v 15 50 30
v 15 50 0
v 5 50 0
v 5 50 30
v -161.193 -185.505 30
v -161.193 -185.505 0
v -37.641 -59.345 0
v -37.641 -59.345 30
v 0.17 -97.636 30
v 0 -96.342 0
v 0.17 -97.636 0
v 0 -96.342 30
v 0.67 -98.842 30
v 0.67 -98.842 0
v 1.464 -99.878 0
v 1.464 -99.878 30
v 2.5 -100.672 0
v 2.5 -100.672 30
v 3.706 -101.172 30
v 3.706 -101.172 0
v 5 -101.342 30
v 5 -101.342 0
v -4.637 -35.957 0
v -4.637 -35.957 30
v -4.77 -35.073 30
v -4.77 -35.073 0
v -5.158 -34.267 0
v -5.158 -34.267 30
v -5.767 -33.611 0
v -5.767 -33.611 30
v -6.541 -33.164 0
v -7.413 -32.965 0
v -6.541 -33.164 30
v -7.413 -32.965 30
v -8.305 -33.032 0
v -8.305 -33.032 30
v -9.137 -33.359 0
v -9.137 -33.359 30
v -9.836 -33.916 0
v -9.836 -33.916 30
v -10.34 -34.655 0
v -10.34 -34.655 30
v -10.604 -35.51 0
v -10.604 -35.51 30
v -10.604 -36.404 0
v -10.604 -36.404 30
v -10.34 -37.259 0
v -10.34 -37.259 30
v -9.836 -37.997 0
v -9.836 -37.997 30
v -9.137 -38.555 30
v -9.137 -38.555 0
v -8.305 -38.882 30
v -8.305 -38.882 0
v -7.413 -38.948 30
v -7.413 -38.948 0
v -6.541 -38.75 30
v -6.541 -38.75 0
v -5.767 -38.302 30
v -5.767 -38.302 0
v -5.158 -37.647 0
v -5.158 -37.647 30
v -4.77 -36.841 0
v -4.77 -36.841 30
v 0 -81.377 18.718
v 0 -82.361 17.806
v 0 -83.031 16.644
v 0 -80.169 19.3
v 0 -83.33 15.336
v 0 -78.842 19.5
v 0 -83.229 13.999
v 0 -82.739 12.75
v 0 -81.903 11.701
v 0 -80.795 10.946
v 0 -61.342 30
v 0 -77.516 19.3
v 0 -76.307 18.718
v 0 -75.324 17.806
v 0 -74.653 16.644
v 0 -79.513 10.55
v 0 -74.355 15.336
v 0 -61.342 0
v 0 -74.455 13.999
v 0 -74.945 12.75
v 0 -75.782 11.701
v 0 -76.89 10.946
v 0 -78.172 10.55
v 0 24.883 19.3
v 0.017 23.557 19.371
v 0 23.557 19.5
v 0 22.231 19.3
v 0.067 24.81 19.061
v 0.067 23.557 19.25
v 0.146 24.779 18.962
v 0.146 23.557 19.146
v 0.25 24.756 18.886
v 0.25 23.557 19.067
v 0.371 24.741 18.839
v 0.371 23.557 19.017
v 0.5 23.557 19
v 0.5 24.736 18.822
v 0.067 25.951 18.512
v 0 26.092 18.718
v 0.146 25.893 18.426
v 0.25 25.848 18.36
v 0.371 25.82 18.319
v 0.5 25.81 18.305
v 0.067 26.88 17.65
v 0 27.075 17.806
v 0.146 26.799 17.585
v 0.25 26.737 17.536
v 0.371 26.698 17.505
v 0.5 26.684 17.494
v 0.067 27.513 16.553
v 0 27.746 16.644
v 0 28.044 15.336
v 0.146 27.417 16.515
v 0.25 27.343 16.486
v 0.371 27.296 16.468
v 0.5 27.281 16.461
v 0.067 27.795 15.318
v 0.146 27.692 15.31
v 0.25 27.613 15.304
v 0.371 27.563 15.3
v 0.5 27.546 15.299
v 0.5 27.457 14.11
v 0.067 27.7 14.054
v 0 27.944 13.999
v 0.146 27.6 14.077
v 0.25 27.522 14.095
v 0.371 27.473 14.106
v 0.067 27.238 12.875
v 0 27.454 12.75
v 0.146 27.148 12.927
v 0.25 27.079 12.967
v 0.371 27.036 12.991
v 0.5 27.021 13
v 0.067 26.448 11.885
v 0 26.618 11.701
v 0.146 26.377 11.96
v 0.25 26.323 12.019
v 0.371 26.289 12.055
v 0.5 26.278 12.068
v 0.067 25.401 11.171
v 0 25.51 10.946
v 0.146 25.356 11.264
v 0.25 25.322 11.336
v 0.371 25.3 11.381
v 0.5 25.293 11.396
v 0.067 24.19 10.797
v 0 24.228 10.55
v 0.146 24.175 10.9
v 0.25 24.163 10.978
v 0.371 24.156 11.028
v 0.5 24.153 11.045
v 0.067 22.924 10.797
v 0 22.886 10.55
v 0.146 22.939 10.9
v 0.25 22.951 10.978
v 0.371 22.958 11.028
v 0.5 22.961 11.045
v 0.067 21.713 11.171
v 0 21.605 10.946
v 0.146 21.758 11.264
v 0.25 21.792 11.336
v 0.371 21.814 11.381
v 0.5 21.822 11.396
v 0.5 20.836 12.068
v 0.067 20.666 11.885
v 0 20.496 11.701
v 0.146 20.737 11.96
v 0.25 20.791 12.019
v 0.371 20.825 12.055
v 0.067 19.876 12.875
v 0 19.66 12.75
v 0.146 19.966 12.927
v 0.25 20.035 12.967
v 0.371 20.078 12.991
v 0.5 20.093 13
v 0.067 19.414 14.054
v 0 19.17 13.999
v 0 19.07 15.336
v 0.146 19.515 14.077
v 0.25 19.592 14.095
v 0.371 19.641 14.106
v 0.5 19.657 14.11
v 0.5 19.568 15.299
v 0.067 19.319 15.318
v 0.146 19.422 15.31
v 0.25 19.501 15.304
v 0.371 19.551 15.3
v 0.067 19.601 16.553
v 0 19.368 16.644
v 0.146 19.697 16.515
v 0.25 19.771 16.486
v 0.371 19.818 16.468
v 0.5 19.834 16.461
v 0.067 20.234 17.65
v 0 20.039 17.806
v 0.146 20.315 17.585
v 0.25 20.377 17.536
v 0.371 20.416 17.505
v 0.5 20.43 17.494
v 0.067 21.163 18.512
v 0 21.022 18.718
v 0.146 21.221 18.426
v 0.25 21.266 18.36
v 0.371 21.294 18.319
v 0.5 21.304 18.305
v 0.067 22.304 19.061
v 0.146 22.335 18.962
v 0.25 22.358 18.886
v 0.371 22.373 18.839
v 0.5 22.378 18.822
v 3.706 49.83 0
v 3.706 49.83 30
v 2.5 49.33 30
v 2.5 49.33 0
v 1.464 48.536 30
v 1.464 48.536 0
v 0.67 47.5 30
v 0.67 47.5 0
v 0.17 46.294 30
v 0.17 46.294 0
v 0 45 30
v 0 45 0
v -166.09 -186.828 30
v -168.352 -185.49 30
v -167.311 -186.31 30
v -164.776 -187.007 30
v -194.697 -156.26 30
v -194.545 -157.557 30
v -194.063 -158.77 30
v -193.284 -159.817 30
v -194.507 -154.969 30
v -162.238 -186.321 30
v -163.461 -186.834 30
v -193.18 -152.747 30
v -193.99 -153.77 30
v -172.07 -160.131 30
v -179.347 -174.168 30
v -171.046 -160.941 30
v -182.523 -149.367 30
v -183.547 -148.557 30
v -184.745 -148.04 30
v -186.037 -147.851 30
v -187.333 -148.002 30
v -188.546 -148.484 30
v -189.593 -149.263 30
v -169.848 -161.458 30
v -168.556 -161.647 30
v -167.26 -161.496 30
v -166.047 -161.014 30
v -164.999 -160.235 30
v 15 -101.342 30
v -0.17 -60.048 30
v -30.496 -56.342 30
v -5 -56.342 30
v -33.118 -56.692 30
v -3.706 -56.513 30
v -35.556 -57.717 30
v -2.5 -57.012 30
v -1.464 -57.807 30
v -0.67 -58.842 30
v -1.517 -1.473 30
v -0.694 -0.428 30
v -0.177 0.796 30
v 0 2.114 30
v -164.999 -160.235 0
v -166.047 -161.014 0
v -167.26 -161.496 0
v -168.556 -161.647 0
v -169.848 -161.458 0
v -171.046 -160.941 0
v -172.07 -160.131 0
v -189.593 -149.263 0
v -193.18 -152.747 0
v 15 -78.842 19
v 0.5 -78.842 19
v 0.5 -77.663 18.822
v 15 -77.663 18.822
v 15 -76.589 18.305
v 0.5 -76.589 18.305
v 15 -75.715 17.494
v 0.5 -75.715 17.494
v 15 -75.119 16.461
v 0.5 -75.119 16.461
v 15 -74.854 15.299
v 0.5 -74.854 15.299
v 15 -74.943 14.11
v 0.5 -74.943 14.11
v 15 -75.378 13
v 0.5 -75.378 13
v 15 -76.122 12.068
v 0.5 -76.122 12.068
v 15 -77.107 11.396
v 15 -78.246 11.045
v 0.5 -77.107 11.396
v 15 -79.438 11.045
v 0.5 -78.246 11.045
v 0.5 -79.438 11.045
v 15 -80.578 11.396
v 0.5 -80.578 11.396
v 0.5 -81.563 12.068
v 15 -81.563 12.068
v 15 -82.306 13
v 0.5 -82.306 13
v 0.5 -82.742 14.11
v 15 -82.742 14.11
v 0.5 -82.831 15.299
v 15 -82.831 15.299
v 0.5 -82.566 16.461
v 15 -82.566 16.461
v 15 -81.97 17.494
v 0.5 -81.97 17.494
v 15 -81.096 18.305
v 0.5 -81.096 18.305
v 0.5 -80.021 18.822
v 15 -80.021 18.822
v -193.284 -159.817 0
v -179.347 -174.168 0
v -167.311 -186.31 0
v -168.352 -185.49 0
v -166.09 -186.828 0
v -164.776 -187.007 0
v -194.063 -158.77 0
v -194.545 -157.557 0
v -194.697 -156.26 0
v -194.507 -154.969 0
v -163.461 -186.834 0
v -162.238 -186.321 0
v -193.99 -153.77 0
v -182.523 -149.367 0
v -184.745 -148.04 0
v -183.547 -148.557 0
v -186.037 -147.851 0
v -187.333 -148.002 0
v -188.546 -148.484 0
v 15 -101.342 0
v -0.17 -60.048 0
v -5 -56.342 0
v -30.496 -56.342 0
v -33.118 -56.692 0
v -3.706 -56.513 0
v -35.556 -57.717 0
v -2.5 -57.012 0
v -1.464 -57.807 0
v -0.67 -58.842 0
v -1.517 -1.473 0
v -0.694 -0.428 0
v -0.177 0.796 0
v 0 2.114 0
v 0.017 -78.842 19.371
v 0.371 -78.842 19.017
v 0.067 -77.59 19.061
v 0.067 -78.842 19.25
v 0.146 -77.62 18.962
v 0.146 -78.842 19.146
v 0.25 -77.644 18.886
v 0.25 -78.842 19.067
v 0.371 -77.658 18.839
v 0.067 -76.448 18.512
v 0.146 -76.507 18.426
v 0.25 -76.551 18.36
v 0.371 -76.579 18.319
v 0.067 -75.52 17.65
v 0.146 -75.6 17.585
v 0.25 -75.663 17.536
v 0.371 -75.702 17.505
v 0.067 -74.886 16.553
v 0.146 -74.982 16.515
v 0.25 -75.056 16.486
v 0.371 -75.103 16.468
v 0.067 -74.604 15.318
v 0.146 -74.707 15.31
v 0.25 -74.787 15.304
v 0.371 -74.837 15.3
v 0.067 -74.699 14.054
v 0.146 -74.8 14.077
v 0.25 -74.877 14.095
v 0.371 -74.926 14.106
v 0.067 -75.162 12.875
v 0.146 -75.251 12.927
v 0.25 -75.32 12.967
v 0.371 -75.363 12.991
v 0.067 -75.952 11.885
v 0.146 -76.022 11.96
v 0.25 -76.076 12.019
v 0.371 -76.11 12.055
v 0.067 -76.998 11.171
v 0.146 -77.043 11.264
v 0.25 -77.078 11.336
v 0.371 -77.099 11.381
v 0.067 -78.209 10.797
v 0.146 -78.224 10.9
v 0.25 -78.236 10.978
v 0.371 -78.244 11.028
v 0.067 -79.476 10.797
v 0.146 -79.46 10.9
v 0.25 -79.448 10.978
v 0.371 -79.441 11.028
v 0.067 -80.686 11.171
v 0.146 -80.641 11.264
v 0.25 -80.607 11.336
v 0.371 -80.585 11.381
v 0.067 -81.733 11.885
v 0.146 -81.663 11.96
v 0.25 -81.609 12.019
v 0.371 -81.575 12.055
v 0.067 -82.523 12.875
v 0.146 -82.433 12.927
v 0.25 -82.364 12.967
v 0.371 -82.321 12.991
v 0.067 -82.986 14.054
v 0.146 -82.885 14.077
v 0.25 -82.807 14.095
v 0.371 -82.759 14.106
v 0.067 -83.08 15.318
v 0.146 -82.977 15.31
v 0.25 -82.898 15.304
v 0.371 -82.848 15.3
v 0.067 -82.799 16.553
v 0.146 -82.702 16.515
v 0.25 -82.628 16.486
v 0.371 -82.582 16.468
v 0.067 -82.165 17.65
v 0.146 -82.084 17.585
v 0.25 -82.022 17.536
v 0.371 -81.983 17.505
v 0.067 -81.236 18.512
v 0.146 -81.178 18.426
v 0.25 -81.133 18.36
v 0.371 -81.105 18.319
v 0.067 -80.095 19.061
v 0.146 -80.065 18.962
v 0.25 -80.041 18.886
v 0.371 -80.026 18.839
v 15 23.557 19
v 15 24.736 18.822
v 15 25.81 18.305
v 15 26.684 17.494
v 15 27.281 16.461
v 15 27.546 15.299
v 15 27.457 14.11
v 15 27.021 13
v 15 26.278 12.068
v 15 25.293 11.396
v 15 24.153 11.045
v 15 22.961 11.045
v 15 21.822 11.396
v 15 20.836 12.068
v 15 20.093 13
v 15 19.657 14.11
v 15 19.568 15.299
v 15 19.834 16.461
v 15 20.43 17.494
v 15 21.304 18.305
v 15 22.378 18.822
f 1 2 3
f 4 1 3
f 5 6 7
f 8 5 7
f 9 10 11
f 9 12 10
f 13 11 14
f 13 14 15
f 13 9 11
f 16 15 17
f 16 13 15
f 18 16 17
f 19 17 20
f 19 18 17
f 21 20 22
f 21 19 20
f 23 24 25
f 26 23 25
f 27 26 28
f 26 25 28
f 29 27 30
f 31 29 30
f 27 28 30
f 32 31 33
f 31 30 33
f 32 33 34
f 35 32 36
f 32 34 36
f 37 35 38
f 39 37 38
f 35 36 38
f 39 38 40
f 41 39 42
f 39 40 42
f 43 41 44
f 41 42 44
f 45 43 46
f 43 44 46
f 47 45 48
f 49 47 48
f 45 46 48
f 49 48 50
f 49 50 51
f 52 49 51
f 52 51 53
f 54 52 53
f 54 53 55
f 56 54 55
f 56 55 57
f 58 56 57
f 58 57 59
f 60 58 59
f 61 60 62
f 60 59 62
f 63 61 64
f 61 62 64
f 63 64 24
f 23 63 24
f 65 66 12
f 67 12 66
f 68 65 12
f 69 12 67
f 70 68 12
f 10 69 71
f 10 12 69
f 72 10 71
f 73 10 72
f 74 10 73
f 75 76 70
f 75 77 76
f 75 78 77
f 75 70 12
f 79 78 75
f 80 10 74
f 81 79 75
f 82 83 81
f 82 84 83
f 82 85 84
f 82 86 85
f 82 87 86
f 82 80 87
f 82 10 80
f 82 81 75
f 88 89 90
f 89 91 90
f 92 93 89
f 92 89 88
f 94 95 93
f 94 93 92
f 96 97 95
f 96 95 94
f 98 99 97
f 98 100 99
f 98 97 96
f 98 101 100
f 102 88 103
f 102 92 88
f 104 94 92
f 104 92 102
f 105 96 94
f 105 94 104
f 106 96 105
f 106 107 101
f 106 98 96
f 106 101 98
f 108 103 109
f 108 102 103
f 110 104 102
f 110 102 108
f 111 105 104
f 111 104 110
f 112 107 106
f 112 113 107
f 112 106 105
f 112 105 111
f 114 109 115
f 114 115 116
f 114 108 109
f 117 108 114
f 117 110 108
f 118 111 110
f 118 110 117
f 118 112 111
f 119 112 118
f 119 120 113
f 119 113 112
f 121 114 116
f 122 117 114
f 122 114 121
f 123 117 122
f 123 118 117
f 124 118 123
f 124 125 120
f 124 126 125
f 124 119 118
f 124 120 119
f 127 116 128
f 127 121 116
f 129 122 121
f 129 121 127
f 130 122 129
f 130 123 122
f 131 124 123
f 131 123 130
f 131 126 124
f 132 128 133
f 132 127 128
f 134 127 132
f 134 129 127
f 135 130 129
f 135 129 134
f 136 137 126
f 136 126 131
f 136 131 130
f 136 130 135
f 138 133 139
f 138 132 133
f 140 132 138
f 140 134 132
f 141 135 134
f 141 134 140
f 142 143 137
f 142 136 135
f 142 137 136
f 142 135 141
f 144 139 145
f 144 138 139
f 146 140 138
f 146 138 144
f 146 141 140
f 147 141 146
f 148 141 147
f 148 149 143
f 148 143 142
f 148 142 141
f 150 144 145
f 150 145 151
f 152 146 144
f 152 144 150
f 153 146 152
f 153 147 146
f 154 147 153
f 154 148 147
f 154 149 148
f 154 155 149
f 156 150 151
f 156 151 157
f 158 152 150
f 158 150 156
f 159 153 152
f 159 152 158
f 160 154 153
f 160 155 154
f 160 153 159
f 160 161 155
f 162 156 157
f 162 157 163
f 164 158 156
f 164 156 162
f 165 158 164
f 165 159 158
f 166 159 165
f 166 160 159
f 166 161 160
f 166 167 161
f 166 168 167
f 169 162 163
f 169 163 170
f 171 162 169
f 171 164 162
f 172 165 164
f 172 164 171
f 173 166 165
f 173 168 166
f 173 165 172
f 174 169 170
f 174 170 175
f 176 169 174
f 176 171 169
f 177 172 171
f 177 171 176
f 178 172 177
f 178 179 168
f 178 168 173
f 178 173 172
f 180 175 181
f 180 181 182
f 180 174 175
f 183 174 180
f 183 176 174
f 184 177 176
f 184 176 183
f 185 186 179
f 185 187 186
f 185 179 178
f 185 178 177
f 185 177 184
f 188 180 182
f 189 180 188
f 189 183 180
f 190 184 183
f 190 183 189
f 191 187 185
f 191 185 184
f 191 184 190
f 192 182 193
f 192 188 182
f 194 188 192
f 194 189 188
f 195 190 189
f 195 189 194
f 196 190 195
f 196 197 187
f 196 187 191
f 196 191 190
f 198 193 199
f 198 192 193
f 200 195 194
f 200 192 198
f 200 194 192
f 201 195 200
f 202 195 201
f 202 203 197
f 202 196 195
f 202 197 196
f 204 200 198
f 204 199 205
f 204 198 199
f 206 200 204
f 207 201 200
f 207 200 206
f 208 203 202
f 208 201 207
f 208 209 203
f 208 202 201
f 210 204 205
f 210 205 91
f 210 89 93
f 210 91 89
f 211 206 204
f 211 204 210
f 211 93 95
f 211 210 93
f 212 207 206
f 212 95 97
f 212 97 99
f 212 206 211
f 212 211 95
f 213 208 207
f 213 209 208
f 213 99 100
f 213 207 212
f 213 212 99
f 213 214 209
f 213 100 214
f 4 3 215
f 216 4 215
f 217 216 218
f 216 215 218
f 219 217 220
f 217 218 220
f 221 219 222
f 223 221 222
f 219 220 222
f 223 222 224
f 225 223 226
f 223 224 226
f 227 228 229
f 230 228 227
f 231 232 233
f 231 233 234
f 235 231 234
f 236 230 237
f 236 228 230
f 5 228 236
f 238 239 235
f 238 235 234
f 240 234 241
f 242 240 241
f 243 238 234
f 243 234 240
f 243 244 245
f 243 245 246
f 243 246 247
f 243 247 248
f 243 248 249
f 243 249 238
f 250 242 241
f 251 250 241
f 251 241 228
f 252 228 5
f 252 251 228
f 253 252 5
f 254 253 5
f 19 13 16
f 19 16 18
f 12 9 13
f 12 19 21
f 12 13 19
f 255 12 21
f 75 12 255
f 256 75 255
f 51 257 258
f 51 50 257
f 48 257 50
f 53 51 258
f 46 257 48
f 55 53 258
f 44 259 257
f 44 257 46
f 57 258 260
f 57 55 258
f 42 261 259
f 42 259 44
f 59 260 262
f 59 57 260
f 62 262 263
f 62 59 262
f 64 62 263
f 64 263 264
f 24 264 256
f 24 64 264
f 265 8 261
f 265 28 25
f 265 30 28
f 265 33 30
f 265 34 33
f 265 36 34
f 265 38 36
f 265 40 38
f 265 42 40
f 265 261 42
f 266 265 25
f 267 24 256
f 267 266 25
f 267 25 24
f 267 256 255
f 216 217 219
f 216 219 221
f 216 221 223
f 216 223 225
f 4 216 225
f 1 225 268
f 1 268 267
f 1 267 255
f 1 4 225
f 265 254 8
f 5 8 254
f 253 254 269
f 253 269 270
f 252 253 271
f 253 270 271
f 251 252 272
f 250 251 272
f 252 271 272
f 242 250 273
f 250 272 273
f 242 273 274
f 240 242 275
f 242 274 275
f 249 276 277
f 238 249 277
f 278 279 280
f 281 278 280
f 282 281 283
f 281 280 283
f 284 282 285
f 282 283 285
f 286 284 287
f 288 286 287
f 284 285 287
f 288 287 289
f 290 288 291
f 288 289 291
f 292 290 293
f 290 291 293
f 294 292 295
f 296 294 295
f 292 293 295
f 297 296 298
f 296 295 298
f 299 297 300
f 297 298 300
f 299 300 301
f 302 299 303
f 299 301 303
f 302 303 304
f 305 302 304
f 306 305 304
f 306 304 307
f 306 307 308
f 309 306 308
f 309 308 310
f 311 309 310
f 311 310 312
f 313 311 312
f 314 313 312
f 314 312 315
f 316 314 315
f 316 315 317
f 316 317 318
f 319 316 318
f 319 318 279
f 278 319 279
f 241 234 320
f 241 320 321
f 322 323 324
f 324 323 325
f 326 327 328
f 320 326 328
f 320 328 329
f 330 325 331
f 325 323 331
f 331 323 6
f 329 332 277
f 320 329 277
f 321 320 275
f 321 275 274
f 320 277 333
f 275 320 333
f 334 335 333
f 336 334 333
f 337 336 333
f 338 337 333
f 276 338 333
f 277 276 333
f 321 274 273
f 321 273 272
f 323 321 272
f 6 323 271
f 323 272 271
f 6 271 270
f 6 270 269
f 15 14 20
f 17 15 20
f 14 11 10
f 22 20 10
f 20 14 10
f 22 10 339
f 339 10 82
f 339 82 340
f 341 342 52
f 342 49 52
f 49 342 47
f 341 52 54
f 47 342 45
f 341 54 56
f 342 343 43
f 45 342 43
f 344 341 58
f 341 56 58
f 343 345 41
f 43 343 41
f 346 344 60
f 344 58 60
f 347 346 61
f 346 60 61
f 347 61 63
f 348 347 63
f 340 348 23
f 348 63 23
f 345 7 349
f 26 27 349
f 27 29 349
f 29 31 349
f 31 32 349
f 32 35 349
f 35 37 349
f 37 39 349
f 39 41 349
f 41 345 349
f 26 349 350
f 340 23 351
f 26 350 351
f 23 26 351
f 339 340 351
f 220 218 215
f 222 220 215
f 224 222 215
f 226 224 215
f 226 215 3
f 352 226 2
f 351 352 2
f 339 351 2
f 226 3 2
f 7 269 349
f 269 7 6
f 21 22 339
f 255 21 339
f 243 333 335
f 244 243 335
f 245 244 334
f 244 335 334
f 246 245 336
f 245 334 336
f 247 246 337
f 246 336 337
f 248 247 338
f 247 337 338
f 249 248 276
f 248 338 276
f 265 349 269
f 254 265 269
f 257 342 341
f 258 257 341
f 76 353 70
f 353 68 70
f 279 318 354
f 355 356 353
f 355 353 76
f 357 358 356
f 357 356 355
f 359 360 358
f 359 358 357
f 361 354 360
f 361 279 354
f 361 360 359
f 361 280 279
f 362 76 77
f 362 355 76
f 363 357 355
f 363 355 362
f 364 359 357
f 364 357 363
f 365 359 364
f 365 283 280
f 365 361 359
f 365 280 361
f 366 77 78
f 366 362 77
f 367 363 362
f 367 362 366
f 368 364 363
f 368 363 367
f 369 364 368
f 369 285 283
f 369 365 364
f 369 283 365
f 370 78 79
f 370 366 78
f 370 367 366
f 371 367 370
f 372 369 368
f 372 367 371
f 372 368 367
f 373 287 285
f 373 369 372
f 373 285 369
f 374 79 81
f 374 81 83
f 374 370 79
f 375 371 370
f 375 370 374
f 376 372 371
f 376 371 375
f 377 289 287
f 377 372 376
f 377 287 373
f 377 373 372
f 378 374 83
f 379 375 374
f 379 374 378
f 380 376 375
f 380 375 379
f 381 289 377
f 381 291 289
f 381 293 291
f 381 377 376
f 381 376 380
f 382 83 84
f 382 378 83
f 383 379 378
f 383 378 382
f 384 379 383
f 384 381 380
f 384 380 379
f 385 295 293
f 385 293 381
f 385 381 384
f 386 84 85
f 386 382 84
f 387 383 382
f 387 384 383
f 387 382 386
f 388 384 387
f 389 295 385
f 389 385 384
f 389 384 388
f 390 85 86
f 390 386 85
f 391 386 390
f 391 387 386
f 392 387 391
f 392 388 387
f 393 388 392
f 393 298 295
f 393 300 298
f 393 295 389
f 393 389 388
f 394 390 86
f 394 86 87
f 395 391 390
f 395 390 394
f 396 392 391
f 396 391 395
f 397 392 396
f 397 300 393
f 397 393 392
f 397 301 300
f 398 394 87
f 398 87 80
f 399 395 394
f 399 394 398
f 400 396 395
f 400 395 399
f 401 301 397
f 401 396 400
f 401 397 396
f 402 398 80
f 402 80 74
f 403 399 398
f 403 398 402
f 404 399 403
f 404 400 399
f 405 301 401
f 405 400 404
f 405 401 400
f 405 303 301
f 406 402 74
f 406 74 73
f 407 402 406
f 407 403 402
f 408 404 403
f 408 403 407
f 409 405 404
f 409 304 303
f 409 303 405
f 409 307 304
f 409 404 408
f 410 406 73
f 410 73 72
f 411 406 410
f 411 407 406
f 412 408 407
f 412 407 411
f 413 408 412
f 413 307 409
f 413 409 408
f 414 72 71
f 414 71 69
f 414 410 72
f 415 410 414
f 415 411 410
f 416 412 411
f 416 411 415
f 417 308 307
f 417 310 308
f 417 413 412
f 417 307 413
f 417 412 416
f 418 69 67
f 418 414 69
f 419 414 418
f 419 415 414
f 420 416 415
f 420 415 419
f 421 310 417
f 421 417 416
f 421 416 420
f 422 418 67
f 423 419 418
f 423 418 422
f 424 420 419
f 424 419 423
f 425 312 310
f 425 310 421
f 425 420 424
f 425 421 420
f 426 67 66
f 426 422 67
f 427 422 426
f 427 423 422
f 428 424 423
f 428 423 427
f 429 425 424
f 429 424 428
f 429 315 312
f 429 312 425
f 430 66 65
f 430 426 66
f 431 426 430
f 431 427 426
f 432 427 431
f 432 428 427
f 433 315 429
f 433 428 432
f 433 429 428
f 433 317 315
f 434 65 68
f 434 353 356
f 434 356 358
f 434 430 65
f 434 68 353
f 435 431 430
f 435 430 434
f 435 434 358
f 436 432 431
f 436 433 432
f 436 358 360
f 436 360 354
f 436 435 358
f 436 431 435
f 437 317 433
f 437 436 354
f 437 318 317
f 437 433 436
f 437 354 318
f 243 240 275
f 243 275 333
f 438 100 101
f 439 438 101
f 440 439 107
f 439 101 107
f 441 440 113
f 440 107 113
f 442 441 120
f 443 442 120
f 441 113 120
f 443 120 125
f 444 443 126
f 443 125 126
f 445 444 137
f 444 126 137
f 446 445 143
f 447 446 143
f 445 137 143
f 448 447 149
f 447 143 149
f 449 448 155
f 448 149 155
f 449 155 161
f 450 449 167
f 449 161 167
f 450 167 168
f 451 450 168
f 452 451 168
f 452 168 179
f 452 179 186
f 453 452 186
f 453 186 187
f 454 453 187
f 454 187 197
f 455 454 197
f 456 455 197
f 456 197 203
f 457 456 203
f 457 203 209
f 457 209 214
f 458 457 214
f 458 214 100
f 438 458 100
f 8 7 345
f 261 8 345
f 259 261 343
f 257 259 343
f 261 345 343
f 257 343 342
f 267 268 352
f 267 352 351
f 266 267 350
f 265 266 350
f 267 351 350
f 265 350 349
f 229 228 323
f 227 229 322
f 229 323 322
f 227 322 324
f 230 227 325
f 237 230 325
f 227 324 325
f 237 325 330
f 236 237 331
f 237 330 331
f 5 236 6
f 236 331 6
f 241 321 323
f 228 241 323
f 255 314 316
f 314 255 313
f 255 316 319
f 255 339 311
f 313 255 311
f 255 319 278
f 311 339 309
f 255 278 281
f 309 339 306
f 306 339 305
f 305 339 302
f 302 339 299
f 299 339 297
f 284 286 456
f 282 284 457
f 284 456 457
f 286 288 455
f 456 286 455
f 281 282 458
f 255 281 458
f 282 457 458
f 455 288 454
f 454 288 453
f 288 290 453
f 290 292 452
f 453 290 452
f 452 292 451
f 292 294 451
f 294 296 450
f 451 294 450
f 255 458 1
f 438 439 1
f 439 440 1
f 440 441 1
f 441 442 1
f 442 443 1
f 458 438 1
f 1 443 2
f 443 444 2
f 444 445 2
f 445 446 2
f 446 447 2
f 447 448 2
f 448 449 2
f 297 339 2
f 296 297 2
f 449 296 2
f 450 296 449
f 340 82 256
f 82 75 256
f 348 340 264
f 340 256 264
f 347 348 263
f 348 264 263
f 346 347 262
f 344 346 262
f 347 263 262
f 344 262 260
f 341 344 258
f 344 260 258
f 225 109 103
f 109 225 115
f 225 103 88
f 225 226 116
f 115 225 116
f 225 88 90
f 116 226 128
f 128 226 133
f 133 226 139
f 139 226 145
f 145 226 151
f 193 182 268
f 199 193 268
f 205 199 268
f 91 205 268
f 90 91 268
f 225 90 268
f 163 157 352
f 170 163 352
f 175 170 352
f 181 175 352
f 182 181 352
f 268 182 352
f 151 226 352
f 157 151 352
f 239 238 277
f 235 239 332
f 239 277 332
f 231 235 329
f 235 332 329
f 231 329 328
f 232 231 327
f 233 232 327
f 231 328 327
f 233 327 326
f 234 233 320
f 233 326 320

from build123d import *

# Parameters (mm, degrees)
BOSS_EXTRU_3_DEPTH      = 30
ESQUISSE2_W             = 15
ESQUISSE2_H             = 50
BOSS_EXTRU_4_DEPTH      = 30
CONG_1_R                = 5
ESQUISSE3_R             = 4
ENL_V_MAT_EXTRU_1_DEPTH = 30
ESQUISSE4_R             = 4
ENL_V_MAT_EXTRU_2_DEPTH = 30
CONG_2_R                = 0.5
ESQUISSE5_R             = 3
ENL_V_MAT_EXTRU_3_DEPTH = 30


with BuildPart() as part:
    # Esquisse1 → Boss.-Extru.3 (new body)
    with BuildSketch(Plane.XY):
        with BuildLine():
            Line((-1.516636282, -1.472839764), (-164.999487802, -160.23473102))
            ThreePointArc((-164.999487802, -160.23473102), (-168.55609482, -161.647249147), (-172.069796906, -160.131149351))
            Line((-172.069796906, -160.131149351), (-182.523190666, -149.366912378))
            ThreePointArc((-182.523190666, -149.366912378), (-186.036892752, -147.850812582), (-189.593499771, -149.263330708))
            Line((-189.593499771, -149.263330708), (-193.180445158, -152.746694426))
            ThreePointArc((-193.180445158, -152.746694426), (-194.696544953, -156.260396513), (-193.284026827, -159.817003531))
            Line((-193.284026827, -159.817003531), (-179.34726935, -174.168185892))
            Line((-179.34726935, -174.168185892), (-168.352304295, -185.490098382))
            ThreePointArc((-168.352304295, -185.490098382), (-164.775881538, -187.006723591), (-161.193106921, -185.505165132))
            Line((-161.193106921, -185.505165132), (-37.640520995, -59.345455931))
            ThreePointArc((-37.640520995, -59.345455931), (-34.371026094, -57.123623648), (-30.496017021, -56.342316868))
            Line((-30.496017021, -56.342316868), (10, -56.342316868))
            ThreePointArc((10, -56.342316868), (13.535533906, -54.877850774), (15, -51.342316868))
            Line((15, -51.342316868), (15, -6.342316868))
            Line((15, -6.342316868), (15, 50))
            Line((15, 50), (5, 50))
            ThreePointArc((5, 50), (1.464466094, 48.535533906), (0, 45))
            Line((0, 45), (0, 2.114105623))
            ThreePointArc((0, 2.114105623), (-0.394741126, 0.166904887), (-1.516636282, -1.472839764))
        make_face()
    extrude(amount=BOSS_EXTRU_3_DEPTH)

    # Esquisse2 → Boss.-Extru.4 (add)
    with BuildSketch(Plane.XY):
        with Locations((7.5, -76.342316868)):
            Rectangle(ESQUISSE2_W, ESQUISSE2_H)
    extrude(amount=BOSS_EXTRU_4_DEPTH)

    # Congé1
    cong_1_edges = [part.edges().sort_by_distance(p)[0] for p in [
        (0, -56.342316868, 15),
        (0, -101.342316868, 15),
    ]]
    fillet(cong_1_edges, radius=CONG_1_R)

    # Esquisse3 → Enlèv. mat.-Extru.1 (cut)
    with BuildSketch(Plane.ZY):
        with Locations((15, 23.557052811)):
            Circle(ESQUISSE3_R)
    extrude(amount=-ENL_V_MAT_EXTRU_1_DEPTH, mode=Mode.SUBTRACT)

    # Esquisse4 → Enlèv. mat.-Extru.2 (cut)
    with BuildSketch(Plane.ZY):
        with Locations((15, -78.842316868)):
            Circle(ESQUISSE4_R)
    extrude(amount=-ENL_V_MAT_EXTRU_2_DEPTH, mode=Mode.SUBTRACT)

    # Congé2
    cong_2_edges = [part.edges().sort_by_distance(p)[0] for p in [
        (0, 23.557052811, 11),
        (0, -78.842316868, 11),
    ]]
    fillet(cong_2_edges, radius=CONG_2_R)

    # Esquisse5 → Enlèv. mat.-Extru.3 (cut)
    with BuildSketch(Plane.XY.offset(30)):
        with Locations((-7.637173742, -35.95688684)):
            Circle(ESQUISSE5_R)
    extrude(amount=-ENL_V_MAT_EXTRU_3_DEPTH, mode=Mode.SUBTRACT)


solid = part.part
